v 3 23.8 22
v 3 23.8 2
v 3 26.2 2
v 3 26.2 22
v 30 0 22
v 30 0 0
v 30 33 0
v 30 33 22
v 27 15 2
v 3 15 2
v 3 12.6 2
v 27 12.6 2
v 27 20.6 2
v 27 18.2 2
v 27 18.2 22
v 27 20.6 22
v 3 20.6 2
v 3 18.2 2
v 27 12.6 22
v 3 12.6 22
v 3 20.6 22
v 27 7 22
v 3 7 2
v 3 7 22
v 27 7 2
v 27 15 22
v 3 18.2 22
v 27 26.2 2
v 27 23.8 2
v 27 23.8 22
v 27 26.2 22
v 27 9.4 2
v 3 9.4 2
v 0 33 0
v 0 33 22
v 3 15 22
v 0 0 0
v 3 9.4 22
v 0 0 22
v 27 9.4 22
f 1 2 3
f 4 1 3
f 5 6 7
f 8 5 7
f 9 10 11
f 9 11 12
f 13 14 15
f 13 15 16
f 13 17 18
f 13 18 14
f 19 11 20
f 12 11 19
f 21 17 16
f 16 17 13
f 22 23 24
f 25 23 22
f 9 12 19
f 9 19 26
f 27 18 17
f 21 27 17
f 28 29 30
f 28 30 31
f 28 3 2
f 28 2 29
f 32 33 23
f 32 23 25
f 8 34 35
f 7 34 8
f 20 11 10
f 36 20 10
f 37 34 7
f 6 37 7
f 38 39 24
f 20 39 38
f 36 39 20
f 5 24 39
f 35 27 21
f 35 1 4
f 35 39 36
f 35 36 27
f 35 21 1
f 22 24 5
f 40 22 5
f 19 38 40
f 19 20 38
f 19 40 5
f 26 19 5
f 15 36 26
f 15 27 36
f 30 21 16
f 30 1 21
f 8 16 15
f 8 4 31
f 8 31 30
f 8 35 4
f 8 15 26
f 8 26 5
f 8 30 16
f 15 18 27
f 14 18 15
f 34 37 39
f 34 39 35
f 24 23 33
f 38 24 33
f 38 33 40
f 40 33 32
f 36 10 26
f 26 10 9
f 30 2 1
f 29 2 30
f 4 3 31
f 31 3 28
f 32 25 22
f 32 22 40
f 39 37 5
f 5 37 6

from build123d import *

# Parameters (mm, degrees)
BOX002_W     = 24
BOX002_H     = 2.4
BOX002_DEPTH = 20
BOX003_W     = 24
BOX003_H     = 2.4
BOX003_DEPTH = 20
BOX004_W     = 24
BOX004_H     = 2.4
BOX004_DEPTH = 20
BOX001_W     = 24
BOX001_H     = 2.4
BOX001_DEPTH = 20
BOX_W        = 30
BOX_H        = 33
BOX_DEPTH    = 22


with BuildPart() as box002:
    # Box002 → Box002 (new body)
    with BuildSketch(Plane(origin=(0, 5.6, 0), x_dir=(1, 0, 0), z_dir=(0, 0, 1))):
        with Locations((12, 1.2)):
            Rectangle(BOX002_W, BOX002_H)
    extrude(amount=BOX002_DEPTH)


with BuildPart() as box003:
    # Box003 → Box003 (new body)
    with BuildSketch(Plane(origin=(0, 11.2, 0), x_dir=(1, 0, 0), z_dir=(0, 0, 1))):
        with Locations((12, 1.2)):
            Rectangle(BOX003_W, BOX003_H)
    extrude(amount=BOX003_DEPTH)


with BuildPart() as box004:
    # Box004 → Box004 (new body)
    with BuildSketch(Plane(origin=(0, 16.8, 0), x_dir=(1, 0, 0), z_dir=(0, 0, 1))):
        with Locations((12, 1.2)):
            Rectangle(BOX004_W, BOX004_H)
    extrude(amount=BOX004_DEPTH)


with BuildPart() as ranuras:
    # Box001 → Box001 (new body)
    with BuildSketch(Plane.XY):
        with Locations((12, 1.2)):
            Rectangle(BOX001_W, BOX001_H)
    extrude(amount=BOX001_DEPTH)

    # Fusion: union Box002, Box003, Box004
    add(box002.part)
    add(box003.part)
    add(box004.part)


with BuildPart() as ranuras_1:
    # Fusion placement: moved
    add(ranuras.part.moved(Location((3, 7, 2))))


with BuildPart() as porta_sd:
    # Box → Box (new body)
    with BuildSketch(Plane.XY):
        with Locations((15, 16.5)):
            Rectangle(BOX_W, BOX_H)
    extrude(amount=BOX_DEPTH)

    # Cut: cut Ranuras
    add(ranuras_1.part, mode=Mode.SUBTRACT)


solid = porta_sd.part
